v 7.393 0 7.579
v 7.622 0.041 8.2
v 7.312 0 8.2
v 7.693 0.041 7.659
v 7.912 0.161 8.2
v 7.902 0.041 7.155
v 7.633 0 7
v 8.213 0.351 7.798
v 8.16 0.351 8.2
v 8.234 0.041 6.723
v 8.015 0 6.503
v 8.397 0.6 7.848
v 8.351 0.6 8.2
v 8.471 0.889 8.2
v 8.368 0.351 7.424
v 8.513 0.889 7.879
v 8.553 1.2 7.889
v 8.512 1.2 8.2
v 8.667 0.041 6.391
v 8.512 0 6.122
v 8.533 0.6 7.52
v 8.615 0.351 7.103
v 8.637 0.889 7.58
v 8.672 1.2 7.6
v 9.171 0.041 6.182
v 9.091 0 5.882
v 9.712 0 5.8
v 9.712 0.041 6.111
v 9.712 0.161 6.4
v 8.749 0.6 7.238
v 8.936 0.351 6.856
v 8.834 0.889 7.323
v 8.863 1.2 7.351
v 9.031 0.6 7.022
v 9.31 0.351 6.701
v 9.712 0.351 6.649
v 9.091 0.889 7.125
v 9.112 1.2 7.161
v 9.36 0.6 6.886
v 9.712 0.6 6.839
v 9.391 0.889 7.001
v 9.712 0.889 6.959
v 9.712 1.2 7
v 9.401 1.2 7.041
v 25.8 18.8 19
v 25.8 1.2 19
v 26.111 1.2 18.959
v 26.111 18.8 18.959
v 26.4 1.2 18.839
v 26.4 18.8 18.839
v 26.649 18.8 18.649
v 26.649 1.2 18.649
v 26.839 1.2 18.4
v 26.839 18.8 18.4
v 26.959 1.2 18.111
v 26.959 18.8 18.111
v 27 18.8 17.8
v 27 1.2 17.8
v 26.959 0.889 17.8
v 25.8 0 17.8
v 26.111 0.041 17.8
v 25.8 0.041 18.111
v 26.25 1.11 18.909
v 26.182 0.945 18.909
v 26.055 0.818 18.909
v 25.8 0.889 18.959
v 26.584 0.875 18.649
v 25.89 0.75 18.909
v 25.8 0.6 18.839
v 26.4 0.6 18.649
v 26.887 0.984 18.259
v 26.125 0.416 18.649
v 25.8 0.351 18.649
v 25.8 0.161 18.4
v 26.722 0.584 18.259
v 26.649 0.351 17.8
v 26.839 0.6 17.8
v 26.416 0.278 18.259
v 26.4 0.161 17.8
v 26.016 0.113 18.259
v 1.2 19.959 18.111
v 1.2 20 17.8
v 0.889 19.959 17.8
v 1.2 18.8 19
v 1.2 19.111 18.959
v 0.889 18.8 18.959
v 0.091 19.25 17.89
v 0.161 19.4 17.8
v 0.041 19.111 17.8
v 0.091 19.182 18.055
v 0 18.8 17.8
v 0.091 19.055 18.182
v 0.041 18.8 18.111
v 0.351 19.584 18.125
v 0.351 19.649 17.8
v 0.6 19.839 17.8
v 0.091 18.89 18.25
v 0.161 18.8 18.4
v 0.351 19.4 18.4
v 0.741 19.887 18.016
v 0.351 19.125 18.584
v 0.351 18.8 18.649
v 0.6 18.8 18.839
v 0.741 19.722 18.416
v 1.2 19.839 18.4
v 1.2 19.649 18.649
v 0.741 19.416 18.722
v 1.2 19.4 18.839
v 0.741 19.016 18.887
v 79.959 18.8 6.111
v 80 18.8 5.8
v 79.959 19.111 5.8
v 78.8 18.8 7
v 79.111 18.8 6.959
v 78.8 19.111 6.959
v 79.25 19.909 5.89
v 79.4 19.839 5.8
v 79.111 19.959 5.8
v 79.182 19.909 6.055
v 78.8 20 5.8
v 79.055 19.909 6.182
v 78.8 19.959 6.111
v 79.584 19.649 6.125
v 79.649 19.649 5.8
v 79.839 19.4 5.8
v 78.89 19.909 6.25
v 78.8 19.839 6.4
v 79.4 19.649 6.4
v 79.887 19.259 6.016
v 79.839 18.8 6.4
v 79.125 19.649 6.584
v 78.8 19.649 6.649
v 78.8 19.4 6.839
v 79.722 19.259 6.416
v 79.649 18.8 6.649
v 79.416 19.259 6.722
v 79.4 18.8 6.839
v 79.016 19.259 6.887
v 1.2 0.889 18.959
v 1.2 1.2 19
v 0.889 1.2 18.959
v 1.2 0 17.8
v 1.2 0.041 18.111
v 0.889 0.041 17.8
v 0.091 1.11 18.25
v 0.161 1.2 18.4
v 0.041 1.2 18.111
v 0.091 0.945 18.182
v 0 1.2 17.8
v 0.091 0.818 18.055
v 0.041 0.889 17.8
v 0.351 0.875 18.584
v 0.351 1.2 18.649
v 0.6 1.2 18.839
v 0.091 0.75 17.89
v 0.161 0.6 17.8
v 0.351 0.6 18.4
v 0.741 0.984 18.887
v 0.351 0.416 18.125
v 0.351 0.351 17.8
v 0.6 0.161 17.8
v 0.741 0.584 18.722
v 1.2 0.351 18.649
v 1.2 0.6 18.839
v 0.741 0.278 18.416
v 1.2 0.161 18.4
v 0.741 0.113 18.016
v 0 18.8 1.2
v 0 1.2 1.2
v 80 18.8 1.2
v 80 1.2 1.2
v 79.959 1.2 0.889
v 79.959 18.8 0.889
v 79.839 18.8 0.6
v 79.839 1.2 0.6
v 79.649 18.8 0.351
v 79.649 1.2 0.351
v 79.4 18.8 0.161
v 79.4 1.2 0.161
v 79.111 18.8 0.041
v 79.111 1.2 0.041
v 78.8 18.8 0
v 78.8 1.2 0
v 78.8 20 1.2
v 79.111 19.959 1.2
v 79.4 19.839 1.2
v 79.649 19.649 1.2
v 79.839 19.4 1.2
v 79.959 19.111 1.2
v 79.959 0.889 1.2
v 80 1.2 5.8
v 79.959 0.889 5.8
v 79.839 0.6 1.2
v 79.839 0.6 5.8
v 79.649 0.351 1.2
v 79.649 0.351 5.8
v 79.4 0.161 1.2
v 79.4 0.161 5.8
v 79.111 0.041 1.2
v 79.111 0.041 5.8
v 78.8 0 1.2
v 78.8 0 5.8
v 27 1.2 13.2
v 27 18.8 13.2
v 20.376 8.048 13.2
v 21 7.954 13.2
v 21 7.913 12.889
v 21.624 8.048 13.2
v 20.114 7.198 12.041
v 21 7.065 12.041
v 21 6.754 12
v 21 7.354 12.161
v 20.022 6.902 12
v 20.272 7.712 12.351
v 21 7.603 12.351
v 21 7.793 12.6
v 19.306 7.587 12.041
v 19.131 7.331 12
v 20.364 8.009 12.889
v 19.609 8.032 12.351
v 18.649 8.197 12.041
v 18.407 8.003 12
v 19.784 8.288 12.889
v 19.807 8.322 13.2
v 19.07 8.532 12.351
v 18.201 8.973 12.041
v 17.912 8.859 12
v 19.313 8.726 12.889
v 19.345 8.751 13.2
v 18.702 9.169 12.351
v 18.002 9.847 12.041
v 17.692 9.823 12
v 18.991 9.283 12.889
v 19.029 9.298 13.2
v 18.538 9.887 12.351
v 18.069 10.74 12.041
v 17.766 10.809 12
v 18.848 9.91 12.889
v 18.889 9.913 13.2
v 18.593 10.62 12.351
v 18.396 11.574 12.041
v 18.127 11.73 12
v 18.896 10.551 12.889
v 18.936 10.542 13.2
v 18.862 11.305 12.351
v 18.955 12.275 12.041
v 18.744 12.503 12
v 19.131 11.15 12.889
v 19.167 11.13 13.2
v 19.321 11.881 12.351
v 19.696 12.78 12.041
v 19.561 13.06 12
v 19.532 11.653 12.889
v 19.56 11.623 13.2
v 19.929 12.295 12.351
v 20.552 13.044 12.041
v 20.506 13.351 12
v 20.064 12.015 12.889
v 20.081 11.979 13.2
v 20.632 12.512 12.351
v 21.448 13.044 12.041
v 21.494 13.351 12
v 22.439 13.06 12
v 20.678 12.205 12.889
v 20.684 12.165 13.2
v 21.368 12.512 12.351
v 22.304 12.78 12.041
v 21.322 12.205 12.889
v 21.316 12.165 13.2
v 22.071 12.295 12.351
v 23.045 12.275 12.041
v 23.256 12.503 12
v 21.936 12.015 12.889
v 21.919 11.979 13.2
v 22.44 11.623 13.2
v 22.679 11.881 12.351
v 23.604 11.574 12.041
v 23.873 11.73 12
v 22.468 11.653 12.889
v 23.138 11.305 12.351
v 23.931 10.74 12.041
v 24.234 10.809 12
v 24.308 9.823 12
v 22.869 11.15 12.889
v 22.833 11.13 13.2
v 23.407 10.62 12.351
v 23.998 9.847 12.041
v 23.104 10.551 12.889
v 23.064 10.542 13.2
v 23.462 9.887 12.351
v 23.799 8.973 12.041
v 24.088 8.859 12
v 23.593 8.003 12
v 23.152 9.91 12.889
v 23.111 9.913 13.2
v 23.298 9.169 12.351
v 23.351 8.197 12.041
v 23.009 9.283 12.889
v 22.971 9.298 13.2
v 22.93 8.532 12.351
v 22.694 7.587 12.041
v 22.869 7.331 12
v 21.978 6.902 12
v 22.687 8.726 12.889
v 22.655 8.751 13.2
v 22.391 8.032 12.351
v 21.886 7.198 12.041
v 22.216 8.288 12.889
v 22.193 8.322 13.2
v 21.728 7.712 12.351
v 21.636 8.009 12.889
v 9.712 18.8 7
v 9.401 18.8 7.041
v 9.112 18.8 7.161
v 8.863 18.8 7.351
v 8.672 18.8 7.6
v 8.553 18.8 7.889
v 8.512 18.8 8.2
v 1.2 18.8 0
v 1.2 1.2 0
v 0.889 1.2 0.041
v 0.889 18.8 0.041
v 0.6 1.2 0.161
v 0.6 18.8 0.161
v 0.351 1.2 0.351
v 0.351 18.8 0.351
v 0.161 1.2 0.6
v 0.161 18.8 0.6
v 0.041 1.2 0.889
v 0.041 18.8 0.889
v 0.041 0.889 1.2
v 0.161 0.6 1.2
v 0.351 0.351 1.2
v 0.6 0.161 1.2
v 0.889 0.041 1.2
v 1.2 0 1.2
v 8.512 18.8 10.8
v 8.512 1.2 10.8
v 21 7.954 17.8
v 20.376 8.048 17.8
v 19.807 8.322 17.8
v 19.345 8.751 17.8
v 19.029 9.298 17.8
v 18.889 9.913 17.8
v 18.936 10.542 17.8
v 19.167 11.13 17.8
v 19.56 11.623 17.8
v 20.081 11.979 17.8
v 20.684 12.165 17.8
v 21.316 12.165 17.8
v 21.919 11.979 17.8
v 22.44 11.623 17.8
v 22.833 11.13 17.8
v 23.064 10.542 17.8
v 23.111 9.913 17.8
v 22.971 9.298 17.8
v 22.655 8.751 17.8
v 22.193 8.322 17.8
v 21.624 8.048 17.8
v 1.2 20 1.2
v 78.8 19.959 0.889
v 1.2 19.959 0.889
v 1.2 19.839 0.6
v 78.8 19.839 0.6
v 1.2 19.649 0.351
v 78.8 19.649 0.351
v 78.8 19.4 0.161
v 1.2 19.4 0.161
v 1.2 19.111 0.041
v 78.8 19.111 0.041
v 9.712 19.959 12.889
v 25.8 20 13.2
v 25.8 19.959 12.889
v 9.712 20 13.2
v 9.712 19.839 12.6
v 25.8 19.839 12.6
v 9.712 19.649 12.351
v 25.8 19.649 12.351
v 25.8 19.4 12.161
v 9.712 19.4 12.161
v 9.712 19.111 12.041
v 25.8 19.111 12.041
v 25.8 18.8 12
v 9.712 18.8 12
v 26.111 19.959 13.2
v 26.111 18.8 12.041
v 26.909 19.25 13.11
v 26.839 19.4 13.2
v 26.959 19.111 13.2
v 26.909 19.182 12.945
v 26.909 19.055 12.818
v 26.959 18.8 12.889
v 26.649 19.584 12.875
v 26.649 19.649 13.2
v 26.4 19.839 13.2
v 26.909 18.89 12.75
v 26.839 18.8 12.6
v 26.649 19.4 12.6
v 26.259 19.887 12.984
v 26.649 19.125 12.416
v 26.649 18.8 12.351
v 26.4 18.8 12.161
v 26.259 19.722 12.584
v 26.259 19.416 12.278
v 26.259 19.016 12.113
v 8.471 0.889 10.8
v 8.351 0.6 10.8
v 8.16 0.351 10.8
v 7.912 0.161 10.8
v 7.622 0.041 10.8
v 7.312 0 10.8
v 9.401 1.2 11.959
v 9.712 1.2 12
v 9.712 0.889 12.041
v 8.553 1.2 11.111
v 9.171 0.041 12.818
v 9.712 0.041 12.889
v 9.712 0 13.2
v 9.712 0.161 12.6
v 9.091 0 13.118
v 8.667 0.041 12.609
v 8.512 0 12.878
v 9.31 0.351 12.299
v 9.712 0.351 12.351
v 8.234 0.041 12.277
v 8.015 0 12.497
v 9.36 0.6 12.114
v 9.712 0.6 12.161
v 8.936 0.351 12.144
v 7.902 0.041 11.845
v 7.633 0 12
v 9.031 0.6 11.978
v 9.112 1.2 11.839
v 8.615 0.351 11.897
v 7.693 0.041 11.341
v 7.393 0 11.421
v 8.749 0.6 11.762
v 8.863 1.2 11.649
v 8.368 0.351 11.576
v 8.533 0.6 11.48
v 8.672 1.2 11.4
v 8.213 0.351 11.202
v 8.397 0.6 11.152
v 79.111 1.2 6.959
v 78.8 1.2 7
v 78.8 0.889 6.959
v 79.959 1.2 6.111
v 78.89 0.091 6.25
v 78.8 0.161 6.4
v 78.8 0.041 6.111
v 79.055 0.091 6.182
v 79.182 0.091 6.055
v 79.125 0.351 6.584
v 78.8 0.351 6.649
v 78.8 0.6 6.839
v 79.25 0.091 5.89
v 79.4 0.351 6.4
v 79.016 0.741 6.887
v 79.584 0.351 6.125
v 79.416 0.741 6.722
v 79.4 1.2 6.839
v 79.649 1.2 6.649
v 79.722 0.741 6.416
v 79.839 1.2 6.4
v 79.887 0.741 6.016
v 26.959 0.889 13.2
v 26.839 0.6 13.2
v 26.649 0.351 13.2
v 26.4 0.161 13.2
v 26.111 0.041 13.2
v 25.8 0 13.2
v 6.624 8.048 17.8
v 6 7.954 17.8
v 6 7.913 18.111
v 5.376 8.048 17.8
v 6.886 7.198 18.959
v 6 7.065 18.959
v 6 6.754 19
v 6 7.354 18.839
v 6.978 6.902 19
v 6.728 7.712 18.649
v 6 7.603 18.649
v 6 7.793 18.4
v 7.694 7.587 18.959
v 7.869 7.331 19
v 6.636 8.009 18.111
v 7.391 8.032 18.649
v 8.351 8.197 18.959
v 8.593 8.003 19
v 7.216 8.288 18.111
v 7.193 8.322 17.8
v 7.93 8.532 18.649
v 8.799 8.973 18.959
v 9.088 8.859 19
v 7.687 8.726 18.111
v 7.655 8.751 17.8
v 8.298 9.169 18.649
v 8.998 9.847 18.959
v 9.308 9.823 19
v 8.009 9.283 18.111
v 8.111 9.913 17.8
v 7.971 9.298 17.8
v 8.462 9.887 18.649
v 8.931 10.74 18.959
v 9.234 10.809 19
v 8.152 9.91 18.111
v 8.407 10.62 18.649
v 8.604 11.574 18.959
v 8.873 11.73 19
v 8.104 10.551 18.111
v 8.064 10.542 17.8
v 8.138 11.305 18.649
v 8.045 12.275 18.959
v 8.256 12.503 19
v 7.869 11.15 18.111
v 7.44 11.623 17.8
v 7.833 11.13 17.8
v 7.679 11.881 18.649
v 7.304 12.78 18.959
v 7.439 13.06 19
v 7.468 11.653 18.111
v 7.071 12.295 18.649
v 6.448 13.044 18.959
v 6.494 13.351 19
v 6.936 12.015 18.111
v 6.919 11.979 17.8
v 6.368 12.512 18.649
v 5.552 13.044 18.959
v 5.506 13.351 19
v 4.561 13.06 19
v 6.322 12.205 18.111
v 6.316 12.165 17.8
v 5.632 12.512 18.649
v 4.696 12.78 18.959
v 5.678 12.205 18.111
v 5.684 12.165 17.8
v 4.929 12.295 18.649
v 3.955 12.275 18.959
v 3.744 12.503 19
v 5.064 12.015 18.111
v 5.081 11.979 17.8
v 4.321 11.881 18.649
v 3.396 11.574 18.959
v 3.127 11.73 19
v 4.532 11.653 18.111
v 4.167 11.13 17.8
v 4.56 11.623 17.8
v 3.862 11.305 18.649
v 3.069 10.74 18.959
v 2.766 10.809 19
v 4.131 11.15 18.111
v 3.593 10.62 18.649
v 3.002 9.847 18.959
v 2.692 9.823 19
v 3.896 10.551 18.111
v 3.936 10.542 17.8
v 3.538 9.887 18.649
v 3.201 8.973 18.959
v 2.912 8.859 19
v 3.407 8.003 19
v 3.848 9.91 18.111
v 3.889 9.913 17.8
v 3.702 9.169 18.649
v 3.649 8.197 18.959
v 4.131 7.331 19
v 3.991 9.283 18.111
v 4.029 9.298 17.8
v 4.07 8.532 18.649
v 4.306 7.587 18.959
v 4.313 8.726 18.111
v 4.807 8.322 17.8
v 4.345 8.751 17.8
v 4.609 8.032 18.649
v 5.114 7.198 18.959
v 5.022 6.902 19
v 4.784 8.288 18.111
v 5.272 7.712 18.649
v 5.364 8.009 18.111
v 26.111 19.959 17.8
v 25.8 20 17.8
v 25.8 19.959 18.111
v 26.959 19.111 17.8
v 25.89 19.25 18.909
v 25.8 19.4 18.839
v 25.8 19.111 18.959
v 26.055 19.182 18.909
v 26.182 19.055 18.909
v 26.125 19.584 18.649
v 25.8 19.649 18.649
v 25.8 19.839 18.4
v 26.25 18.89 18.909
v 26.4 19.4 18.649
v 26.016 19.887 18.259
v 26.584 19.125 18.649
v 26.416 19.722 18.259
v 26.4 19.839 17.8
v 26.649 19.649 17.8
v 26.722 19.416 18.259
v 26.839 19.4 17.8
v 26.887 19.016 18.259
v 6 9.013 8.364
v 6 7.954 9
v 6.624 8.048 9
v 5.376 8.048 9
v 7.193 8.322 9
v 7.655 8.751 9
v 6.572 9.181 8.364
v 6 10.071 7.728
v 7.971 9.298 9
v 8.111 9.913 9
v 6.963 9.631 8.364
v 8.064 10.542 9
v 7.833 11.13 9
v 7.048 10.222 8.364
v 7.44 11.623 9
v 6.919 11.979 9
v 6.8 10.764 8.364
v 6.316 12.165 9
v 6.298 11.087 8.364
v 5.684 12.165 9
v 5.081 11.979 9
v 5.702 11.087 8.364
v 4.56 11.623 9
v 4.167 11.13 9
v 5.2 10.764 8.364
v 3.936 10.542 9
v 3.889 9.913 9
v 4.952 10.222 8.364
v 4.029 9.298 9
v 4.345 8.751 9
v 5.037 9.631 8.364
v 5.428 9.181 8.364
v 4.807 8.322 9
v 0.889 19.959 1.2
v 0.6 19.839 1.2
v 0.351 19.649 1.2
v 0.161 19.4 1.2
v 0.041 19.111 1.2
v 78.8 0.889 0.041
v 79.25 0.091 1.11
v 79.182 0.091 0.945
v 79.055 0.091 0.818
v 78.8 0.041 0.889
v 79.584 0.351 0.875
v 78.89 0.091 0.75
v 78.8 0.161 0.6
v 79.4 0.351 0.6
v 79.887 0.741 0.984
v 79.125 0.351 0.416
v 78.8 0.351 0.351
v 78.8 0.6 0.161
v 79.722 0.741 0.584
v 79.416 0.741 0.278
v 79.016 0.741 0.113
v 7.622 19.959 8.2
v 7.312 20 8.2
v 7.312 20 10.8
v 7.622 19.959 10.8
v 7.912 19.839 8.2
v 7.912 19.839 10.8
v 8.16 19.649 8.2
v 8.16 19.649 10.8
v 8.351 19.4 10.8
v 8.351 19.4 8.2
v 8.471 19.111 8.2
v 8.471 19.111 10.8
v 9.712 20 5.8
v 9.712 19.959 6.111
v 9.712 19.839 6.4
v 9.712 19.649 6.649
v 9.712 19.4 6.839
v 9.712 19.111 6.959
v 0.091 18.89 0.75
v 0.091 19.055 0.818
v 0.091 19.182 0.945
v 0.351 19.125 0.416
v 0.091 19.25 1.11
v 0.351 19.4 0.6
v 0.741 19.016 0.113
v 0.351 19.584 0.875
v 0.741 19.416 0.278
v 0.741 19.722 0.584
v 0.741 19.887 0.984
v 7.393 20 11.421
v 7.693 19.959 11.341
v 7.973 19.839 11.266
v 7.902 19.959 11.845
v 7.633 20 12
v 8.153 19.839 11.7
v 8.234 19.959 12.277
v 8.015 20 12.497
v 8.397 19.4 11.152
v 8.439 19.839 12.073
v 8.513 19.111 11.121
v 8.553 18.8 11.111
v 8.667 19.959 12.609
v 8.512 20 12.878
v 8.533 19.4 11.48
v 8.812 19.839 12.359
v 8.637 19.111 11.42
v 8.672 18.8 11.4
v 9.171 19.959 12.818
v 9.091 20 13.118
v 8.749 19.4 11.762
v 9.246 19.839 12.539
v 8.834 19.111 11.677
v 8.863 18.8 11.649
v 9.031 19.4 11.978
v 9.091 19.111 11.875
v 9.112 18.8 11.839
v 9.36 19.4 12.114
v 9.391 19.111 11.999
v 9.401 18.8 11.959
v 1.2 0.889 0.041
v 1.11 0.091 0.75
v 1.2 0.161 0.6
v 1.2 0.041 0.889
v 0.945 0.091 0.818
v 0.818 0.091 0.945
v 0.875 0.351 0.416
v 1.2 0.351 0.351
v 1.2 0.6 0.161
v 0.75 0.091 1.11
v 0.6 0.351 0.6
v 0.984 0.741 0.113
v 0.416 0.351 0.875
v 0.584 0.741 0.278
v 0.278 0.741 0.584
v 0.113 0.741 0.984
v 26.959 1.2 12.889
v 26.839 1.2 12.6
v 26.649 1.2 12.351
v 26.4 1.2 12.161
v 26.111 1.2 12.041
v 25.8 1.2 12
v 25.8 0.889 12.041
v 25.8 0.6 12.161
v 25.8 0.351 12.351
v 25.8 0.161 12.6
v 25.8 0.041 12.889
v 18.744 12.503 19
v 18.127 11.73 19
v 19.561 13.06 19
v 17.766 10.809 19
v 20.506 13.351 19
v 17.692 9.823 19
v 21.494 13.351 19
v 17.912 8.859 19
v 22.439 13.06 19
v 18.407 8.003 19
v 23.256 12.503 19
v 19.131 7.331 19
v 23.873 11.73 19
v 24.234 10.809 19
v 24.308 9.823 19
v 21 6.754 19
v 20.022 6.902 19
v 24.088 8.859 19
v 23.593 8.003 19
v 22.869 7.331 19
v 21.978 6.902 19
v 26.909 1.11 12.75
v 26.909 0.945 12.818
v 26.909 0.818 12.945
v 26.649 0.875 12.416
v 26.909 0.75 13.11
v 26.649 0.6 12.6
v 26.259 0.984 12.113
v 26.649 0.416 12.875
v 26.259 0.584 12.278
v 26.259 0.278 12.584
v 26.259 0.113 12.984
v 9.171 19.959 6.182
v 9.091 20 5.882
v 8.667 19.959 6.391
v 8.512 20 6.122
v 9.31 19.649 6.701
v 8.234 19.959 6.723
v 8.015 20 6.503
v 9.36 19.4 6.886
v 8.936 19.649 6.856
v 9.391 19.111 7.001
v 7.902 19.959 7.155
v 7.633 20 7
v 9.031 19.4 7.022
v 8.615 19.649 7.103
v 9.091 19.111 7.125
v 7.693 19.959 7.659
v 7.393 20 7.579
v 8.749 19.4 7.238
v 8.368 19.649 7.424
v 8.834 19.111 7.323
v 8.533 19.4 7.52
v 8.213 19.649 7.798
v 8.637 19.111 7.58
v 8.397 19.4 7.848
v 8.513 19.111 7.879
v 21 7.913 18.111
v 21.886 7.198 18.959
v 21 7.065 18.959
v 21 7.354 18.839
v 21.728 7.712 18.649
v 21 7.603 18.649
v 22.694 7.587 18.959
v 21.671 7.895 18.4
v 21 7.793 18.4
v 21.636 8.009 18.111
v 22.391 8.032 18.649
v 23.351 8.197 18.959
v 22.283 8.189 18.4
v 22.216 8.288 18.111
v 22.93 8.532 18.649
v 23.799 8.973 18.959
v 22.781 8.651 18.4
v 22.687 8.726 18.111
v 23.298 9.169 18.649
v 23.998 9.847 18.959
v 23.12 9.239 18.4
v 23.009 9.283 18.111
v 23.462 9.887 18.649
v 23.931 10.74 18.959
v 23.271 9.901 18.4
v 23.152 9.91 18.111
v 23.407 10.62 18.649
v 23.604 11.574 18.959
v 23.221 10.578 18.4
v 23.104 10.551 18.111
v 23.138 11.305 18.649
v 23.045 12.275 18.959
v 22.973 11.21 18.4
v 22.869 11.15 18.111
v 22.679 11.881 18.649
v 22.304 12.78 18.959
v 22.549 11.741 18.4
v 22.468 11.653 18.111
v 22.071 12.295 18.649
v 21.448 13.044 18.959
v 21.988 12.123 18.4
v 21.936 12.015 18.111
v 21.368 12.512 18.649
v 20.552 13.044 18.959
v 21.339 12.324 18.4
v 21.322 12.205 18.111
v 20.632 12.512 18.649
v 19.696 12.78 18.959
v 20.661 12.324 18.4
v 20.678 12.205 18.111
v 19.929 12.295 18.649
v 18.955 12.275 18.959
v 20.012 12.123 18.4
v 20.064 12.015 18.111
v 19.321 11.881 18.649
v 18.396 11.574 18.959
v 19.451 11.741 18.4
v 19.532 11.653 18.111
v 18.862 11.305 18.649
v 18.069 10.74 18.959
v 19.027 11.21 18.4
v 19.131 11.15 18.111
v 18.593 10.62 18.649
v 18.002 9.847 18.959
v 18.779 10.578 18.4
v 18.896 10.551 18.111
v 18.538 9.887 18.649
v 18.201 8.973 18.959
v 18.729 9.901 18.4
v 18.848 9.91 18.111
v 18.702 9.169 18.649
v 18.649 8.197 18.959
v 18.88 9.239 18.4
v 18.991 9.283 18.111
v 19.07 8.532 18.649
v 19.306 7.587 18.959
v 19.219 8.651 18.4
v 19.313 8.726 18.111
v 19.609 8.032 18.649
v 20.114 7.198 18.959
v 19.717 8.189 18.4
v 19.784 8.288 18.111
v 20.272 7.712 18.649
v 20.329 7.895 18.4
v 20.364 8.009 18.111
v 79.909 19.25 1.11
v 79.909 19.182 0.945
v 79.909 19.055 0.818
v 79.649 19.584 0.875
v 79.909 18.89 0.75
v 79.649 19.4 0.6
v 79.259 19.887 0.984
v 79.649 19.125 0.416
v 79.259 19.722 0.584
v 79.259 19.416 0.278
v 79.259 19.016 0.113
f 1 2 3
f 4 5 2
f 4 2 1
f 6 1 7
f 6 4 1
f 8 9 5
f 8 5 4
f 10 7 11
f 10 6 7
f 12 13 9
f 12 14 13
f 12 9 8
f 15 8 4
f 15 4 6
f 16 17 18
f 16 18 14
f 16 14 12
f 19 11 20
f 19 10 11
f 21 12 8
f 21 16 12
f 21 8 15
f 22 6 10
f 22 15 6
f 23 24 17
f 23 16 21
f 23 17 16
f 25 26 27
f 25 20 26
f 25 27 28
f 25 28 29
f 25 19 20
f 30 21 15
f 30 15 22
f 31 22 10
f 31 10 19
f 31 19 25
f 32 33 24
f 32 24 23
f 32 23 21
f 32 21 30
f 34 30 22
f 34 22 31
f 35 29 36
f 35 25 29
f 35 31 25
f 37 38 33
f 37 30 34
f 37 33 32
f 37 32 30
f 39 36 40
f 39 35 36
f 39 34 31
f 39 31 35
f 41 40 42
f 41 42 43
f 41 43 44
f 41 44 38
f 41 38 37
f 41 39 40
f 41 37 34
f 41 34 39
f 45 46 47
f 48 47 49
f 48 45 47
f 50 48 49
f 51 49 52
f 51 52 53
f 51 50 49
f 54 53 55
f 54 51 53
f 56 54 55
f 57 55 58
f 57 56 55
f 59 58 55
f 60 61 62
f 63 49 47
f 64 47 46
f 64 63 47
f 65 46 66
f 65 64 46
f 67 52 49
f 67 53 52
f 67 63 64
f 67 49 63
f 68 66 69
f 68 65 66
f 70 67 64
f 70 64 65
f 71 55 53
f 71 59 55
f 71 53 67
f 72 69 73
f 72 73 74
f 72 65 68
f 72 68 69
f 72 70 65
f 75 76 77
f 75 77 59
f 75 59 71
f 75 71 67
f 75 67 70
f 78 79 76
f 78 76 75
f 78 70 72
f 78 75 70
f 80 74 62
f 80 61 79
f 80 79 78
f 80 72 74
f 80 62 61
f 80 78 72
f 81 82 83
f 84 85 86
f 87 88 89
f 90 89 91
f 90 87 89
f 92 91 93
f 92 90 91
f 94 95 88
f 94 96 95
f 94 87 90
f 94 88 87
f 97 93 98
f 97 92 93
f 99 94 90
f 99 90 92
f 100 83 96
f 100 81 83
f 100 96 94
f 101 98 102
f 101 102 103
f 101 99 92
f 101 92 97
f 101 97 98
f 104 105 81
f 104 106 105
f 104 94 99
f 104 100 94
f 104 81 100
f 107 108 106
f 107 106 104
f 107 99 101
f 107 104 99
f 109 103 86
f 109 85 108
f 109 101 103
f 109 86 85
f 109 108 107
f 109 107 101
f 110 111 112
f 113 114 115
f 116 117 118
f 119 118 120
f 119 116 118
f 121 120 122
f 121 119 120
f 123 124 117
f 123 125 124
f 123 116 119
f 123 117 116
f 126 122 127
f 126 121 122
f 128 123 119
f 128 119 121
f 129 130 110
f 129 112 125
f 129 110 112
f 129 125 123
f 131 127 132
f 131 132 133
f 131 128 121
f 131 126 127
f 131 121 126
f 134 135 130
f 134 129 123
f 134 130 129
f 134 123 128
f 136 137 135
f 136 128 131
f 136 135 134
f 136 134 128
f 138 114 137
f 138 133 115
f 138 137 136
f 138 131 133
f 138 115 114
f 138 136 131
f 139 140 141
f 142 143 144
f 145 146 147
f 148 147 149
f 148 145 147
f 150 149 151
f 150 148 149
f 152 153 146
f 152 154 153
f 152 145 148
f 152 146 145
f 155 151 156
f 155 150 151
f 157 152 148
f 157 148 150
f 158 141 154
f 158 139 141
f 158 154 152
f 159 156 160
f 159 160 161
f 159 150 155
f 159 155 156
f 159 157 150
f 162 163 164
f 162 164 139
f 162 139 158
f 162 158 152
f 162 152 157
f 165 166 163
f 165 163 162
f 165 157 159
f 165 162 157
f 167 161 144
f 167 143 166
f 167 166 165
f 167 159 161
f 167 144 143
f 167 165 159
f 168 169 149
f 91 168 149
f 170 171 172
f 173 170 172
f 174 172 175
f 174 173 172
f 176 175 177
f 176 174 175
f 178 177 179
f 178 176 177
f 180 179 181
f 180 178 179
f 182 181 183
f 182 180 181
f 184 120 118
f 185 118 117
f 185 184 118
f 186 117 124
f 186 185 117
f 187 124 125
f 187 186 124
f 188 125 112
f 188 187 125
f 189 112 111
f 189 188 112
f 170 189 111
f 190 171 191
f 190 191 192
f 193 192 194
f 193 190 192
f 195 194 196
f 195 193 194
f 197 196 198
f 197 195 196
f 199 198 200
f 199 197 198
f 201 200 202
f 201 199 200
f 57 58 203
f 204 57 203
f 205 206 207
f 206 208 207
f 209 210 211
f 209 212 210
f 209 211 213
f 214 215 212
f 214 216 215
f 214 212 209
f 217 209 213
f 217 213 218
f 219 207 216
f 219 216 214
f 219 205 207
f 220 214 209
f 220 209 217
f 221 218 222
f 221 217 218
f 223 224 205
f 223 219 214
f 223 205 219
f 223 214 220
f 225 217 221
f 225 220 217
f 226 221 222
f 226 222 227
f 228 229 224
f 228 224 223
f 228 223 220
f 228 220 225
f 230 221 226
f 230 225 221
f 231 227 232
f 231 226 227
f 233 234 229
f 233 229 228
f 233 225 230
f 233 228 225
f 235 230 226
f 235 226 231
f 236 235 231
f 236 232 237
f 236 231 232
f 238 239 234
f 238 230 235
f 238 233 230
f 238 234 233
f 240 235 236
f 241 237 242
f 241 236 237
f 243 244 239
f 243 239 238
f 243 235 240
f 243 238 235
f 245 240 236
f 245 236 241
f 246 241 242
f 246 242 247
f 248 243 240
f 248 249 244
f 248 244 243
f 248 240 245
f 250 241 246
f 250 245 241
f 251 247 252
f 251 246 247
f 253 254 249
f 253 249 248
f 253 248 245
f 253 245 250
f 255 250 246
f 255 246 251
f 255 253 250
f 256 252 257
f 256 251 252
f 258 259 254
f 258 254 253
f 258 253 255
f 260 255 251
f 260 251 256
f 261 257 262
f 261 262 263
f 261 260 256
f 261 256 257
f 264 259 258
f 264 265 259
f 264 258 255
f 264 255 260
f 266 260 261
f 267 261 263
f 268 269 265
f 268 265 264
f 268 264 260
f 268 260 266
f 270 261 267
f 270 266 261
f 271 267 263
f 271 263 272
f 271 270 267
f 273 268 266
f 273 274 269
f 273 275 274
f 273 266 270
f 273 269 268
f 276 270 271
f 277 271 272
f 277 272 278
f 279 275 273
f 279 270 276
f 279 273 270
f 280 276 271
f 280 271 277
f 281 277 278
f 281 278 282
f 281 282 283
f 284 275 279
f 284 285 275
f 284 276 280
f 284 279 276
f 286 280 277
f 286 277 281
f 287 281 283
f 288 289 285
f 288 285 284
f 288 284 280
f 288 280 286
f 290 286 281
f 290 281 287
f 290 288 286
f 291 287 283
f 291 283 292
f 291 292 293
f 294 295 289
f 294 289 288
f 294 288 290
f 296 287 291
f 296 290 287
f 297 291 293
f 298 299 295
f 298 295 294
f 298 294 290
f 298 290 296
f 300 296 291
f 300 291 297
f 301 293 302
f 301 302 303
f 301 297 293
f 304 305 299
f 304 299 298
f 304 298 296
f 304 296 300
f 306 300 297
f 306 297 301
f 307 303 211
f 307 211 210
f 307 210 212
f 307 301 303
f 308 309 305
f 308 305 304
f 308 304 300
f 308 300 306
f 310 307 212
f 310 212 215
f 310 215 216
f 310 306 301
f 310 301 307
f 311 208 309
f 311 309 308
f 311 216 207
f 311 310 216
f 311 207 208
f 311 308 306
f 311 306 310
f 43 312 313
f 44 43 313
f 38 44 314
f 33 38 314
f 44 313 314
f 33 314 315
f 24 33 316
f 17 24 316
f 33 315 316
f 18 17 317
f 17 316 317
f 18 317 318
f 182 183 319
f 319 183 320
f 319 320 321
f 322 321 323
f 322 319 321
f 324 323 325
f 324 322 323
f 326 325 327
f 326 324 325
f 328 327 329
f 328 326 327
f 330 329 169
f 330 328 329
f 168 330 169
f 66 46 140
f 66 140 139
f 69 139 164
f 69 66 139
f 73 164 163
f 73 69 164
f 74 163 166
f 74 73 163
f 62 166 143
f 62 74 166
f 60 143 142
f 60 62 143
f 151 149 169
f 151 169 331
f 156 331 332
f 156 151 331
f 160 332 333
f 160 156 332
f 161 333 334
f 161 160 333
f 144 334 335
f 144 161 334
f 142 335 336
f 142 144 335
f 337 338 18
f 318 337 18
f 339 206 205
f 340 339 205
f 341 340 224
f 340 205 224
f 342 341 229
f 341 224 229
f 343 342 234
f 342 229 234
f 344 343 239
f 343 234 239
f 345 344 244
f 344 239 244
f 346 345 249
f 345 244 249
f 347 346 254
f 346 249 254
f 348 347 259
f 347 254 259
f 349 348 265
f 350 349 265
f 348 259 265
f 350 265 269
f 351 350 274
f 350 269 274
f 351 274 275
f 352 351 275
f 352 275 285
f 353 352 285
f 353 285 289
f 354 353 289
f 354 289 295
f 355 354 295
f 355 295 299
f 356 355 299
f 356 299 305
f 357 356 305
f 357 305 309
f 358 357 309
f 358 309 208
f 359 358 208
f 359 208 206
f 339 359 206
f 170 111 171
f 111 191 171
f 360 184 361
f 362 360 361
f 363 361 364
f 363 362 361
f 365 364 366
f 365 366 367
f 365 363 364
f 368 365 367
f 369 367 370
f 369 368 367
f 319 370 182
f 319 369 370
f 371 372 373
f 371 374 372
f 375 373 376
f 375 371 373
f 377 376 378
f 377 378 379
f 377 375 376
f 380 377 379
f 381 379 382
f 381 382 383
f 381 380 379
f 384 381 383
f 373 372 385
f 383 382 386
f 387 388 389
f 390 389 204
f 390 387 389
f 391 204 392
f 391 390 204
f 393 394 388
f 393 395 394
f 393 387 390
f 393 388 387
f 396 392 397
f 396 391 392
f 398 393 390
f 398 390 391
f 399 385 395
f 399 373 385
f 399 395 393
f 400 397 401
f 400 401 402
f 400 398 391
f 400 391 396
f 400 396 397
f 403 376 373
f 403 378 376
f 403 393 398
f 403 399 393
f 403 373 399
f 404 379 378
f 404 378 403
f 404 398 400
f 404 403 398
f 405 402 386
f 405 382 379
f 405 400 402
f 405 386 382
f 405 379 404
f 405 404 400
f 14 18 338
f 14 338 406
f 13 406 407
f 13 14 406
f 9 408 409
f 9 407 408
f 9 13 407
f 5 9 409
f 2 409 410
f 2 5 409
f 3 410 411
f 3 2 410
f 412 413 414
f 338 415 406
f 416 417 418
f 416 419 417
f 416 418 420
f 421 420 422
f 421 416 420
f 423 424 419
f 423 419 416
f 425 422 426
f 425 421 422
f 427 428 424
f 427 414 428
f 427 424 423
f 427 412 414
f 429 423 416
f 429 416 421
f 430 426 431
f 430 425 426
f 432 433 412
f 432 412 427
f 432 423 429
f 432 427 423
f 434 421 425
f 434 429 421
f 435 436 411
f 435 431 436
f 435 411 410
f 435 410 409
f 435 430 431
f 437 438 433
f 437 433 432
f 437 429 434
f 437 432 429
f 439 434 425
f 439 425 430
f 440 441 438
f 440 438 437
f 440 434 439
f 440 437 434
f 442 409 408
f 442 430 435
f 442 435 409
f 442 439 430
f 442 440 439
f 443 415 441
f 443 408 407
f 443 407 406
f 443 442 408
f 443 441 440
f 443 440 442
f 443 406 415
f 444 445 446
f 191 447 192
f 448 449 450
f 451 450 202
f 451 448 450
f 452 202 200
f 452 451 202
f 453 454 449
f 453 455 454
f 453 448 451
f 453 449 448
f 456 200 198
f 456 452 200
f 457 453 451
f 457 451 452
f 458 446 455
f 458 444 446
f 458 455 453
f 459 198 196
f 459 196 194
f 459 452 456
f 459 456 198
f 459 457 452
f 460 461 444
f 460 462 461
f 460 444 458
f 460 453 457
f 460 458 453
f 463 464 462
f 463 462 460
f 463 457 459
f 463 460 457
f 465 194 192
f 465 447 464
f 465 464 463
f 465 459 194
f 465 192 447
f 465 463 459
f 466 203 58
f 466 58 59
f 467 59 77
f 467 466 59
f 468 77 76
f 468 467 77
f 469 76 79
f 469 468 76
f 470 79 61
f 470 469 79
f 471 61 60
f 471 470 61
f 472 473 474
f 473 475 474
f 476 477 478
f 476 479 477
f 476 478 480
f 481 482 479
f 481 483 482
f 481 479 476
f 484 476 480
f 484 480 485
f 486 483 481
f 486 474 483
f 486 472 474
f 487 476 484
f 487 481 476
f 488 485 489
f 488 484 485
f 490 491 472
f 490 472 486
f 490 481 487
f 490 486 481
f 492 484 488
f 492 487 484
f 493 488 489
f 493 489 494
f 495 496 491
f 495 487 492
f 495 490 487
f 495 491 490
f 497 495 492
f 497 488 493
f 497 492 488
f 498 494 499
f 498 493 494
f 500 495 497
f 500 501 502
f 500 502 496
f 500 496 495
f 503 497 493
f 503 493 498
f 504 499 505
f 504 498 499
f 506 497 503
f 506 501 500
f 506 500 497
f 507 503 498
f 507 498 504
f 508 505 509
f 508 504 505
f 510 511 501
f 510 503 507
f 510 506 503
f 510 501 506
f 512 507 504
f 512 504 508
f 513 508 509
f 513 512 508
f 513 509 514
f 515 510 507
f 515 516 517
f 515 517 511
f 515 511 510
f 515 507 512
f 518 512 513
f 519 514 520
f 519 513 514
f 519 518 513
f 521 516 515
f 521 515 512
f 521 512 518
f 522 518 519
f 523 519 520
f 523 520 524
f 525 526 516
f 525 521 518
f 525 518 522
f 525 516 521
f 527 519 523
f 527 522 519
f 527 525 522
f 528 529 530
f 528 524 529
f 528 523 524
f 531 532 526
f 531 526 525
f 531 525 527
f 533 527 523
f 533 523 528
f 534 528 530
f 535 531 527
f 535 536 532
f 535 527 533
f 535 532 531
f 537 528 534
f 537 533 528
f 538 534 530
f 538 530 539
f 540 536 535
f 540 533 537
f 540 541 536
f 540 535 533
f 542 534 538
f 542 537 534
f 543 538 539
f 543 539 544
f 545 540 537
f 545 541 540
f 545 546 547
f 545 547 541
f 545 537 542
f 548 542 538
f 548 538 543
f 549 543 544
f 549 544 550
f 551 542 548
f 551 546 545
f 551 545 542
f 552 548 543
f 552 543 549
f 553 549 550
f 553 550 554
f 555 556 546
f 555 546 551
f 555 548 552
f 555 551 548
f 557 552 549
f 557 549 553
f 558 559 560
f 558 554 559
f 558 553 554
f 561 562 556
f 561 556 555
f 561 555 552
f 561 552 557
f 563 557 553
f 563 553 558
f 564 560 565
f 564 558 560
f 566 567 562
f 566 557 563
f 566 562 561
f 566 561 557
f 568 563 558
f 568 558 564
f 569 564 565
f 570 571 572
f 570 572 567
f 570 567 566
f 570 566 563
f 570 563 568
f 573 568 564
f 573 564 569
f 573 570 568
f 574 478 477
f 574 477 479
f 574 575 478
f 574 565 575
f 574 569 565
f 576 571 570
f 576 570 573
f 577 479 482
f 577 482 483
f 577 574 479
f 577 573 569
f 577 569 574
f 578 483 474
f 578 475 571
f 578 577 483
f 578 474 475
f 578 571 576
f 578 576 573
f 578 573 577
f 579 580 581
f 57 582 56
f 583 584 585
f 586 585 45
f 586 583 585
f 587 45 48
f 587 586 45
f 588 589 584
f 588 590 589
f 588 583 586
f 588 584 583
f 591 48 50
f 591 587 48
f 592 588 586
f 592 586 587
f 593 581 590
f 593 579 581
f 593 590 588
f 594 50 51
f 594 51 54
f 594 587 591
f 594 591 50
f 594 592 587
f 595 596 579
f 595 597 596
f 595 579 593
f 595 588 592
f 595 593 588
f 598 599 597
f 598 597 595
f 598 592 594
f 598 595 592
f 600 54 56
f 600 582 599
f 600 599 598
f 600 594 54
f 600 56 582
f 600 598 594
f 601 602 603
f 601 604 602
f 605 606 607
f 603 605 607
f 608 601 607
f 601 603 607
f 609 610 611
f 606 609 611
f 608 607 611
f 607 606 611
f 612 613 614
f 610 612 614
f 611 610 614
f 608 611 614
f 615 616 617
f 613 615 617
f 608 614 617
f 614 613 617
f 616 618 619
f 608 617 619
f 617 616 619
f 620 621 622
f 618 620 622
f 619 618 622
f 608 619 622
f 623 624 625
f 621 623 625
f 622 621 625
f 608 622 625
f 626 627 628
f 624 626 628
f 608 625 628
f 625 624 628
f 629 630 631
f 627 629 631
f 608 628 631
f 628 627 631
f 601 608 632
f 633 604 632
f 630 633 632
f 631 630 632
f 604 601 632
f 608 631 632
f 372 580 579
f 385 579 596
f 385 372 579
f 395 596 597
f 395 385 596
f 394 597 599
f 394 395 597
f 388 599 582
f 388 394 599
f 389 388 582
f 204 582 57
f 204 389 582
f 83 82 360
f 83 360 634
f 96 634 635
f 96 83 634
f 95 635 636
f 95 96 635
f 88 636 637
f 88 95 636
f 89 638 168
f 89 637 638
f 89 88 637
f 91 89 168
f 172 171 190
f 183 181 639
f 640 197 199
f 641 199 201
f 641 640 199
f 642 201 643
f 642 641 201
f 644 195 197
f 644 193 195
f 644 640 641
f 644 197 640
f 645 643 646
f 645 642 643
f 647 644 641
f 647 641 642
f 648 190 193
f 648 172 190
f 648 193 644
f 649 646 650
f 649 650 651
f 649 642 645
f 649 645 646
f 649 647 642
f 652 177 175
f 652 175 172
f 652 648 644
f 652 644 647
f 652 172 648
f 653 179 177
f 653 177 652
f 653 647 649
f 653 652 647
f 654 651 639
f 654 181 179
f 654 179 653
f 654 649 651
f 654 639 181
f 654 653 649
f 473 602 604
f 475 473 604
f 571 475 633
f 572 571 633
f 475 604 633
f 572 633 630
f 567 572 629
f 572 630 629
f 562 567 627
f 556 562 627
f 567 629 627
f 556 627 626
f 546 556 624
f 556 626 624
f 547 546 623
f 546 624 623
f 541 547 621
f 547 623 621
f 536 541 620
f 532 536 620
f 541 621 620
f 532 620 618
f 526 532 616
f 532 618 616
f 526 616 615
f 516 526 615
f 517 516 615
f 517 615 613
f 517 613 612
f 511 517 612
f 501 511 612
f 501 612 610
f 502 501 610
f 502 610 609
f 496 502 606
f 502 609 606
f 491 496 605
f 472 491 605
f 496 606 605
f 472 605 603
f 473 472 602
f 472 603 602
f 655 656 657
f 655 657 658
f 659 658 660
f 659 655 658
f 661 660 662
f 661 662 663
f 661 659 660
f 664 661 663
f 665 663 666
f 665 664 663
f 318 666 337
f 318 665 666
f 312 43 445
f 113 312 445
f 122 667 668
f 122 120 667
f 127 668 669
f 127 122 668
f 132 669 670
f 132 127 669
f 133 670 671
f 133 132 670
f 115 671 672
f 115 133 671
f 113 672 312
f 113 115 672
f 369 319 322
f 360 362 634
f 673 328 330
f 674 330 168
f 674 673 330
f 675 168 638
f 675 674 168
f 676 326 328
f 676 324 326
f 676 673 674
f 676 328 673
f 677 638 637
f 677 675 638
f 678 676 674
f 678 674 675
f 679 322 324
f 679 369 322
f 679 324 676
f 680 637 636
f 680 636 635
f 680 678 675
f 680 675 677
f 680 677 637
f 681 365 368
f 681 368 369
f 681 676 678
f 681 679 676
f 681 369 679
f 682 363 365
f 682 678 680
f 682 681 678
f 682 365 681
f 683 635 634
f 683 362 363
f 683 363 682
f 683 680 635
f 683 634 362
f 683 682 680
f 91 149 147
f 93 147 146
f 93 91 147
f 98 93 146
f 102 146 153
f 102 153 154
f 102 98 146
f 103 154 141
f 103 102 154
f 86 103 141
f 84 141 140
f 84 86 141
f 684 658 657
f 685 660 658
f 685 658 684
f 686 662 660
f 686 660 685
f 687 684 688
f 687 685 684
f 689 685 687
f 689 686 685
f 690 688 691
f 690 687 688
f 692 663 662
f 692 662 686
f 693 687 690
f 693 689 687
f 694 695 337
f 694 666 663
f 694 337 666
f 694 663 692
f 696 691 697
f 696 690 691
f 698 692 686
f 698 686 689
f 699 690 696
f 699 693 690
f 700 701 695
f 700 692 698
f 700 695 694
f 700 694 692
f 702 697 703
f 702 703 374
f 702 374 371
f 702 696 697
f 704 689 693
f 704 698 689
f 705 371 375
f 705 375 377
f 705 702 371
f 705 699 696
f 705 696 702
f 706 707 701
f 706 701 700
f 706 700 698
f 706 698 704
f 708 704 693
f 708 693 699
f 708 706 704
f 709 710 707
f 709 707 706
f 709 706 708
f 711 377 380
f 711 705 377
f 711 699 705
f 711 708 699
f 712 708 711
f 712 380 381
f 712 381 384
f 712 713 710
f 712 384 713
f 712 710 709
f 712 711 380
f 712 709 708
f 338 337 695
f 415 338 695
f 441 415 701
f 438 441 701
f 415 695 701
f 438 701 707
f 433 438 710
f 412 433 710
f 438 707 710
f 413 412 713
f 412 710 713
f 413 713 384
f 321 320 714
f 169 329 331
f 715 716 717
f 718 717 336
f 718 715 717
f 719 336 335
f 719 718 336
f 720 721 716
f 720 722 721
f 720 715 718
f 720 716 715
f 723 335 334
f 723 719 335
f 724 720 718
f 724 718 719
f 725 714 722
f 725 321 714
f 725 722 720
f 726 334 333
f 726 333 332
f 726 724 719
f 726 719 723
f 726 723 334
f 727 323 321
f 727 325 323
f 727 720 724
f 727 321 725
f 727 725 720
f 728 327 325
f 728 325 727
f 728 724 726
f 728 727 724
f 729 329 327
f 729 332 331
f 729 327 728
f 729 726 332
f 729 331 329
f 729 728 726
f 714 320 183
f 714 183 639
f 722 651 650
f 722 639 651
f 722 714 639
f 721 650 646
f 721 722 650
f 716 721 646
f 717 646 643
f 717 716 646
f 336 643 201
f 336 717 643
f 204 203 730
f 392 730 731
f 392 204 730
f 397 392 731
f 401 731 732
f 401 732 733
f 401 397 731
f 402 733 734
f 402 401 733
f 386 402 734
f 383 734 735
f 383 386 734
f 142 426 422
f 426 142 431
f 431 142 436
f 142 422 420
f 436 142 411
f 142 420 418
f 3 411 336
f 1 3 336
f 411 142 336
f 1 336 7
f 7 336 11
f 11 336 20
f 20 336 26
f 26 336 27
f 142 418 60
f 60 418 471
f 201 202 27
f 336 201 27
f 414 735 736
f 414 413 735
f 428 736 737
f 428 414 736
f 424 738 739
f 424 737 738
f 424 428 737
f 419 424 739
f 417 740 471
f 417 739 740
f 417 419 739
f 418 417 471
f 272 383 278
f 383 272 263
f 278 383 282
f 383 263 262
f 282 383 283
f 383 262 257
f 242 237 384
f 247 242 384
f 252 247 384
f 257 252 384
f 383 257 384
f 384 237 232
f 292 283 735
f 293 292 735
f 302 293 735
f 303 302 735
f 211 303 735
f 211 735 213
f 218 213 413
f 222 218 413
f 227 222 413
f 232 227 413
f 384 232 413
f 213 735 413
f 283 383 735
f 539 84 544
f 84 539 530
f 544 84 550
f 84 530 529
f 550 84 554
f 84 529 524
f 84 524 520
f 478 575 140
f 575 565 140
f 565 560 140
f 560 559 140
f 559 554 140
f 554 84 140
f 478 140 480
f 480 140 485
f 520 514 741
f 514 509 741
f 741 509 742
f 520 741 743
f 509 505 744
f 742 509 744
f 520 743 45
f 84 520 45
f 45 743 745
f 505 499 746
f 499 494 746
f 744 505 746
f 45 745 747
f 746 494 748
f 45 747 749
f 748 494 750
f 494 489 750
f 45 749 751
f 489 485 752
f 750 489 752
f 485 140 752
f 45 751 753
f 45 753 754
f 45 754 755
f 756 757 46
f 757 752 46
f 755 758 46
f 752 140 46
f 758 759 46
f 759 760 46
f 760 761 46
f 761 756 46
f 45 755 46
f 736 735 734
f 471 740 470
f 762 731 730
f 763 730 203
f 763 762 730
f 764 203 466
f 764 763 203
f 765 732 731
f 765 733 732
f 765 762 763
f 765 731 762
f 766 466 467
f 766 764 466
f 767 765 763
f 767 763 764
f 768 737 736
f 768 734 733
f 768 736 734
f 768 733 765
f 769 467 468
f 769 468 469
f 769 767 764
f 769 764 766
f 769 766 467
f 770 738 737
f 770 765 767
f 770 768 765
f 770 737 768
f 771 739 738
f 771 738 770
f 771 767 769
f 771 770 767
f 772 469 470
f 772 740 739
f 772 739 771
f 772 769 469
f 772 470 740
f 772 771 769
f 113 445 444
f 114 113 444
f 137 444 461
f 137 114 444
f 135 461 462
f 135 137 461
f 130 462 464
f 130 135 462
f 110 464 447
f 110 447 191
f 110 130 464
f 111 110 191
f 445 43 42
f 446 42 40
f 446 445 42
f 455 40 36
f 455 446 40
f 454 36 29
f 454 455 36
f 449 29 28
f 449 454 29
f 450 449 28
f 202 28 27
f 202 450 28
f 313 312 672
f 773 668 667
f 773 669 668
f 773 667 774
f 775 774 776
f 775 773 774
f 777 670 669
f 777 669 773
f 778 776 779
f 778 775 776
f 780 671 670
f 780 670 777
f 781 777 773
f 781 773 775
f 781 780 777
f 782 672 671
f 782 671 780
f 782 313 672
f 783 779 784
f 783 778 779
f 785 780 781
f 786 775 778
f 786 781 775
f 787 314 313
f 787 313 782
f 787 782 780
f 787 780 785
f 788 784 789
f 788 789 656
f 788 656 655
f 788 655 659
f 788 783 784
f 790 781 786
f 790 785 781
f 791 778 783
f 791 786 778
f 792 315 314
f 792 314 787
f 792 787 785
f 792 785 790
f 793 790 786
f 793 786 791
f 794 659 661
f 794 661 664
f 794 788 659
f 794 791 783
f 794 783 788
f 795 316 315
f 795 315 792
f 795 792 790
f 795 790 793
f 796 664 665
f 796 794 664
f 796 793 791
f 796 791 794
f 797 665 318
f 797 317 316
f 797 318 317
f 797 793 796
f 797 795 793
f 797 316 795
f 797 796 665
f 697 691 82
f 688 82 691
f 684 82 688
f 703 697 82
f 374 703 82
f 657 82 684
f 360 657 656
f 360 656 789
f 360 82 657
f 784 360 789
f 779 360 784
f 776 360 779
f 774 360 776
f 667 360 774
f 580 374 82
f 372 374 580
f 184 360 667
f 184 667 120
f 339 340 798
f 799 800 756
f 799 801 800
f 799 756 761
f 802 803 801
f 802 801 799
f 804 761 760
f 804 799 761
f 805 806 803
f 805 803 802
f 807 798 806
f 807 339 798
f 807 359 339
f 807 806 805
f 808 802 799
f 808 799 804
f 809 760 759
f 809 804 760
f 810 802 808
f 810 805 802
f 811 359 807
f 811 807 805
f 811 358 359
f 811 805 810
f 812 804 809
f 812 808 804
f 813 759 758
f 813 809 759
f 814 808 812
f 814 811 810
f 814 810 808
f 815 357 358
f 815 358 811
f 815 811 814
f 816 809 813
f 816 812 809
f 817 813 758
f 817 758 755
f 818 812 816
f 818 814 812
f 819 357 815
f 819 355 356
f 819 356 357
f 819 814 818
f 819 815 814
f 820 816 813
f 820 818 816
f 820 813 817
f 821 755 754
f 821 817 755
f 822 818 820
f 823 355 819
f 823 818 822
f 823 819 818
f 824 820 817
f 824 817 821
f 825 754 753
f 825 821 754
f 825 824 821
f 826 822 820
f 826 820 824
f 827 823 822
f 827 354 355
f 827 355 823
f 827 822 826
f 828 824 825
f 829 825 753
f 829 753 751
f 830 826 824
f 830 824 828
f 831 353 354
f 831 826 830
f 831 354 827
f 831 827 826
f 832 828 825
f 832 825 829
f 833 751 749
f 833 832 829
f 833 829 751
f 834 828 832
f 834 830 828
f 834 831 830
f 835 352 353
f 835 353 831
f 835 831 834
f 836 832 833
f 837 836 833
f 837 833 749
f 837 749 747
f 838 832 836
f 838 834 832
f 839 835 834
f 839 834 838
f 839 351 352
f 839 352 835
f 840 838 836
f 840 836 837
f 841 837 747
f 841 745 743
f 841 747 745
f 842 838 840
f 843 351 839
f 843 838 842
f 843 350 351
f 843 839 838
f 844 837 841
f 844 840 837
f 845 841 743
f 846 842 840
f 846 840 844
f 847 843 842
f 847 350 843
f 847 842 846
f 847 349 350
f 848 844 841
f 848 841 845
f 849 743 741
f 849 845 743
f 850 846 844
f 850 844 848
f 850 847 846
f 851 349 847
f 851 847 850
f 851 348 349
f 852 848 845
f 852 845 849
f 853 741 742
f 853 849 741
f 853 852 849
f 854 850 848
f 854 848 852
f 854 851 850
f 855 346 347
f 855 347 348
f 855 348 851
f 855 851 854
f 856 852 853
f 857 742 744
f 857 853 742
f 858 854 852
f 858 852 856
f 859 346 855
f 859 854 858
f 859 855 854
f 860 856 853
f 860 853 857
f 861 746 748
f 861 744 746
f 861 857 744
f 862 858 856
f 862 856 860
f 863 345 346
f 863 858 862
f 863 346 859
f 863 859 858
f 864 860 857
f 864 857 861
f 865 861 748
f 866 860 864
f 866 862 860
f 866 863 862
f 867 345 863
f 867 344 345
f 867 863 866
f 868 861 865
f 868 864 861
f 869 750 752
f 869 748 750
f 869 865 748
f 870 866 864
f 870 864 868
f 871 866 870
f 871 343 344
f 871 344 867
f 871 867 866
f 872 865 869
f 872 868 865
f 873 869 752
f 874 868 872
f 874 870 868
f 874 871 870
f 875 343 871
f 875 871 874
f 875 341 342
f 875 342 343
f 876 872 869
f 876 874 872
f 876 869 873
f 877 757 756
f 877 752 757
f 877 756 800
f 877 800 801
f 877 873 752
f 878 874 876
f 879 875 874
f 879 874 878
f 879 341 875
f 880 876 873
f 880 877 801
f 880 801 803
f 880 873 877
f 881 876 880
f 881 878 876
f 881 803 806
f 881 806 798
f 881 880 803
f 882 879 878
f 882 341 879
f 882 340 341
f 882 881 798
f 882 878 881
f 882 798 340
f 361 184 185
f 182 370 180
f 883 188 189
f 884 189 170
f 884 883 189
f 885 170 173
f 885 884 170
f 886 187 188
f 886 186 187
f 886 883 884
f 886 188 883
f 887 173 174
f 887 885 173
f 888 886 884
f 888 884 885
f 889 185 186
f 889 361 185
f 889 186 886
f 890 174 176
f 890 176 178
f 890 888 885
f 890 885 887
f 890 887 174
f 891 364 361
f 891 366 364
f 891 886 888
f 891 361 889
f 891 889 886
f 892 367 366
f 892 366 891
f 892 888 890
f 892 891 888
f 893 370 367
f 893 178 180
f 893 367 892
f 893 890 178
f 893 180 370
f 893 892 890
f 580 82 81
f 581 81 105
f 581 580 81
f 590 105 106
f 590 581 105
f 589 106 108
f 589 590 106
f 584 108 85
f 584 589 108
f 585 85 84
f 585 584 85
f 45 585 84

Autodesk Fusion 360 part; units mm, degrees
sketch "Sketch1" plane through (0, 0, 0) normal (0, 1, 0) x (1, 0, 0)
  line L0 (0, 0) -> (0, -19)
  line L1 (0, -19) -> (27, -19)
  line L2 (27, -19) -> (27, -12)
  line L3 (27, -12) -> (8.5117, -12)
  line L4 (8.5117, -12) -> (8.5117, -7)
  line L5 (8.5117, -7) -> (80, -7)
  line L6 (80, -7) -> (80, 0)
  line L7 (80, 0) -> (0, 0)
  dimension "d1" = 80
  dimension "d2" = 27
  dimension "d3" = 5
  dimension "d4" = 7
  dimension "d5" = 7
extrude "Extrude1" add sketch "Sketch1" along normal blind 20
sketch "Sketch2" plane through (0, 0, 19) normal (0, 0, 1) x (-1, 0, 0)
  line L0 (0, 0) -> (-27, 0)
  line L1 (-27, 0) -> (-27, -20)
  line L2 (-27, -20) -> (0, -20)
  line L3 (0, -20) -> (0, 0)
  circle A0 centre (-6, -10.0712) radius 2.5
  circle A1 centre (-21, -10.0712) radius 2.5
  dimension "d8" = 15
  dimension "d9" = 5
  dimension "d10" = 5
  dimension "d11" = 6
hole "Hole1" at (6, 10.0712, 19) direction (0, 0, -1) diameter 4.234 depth 10 tip angle 118
hole "Hole2" at (21, 10.0712, 19) direction (0, 0, -1) diameter 4.234 depth 10 tip angle 118
fillet "Fillet1" radius 1.2 9 faces at (32.3411, 6.6667, 7) (2.8372, 20, 10.3333) (53.3333, 6.6667, 0) (80, 13.3333, 4.6667) (2.8372, 0, 10.3333) (15.6938, 2.7213, 19) (27, 13.3333, 16.6667) (11.9708, 9.971, 12) (0, 6.6667, 6.3333)
